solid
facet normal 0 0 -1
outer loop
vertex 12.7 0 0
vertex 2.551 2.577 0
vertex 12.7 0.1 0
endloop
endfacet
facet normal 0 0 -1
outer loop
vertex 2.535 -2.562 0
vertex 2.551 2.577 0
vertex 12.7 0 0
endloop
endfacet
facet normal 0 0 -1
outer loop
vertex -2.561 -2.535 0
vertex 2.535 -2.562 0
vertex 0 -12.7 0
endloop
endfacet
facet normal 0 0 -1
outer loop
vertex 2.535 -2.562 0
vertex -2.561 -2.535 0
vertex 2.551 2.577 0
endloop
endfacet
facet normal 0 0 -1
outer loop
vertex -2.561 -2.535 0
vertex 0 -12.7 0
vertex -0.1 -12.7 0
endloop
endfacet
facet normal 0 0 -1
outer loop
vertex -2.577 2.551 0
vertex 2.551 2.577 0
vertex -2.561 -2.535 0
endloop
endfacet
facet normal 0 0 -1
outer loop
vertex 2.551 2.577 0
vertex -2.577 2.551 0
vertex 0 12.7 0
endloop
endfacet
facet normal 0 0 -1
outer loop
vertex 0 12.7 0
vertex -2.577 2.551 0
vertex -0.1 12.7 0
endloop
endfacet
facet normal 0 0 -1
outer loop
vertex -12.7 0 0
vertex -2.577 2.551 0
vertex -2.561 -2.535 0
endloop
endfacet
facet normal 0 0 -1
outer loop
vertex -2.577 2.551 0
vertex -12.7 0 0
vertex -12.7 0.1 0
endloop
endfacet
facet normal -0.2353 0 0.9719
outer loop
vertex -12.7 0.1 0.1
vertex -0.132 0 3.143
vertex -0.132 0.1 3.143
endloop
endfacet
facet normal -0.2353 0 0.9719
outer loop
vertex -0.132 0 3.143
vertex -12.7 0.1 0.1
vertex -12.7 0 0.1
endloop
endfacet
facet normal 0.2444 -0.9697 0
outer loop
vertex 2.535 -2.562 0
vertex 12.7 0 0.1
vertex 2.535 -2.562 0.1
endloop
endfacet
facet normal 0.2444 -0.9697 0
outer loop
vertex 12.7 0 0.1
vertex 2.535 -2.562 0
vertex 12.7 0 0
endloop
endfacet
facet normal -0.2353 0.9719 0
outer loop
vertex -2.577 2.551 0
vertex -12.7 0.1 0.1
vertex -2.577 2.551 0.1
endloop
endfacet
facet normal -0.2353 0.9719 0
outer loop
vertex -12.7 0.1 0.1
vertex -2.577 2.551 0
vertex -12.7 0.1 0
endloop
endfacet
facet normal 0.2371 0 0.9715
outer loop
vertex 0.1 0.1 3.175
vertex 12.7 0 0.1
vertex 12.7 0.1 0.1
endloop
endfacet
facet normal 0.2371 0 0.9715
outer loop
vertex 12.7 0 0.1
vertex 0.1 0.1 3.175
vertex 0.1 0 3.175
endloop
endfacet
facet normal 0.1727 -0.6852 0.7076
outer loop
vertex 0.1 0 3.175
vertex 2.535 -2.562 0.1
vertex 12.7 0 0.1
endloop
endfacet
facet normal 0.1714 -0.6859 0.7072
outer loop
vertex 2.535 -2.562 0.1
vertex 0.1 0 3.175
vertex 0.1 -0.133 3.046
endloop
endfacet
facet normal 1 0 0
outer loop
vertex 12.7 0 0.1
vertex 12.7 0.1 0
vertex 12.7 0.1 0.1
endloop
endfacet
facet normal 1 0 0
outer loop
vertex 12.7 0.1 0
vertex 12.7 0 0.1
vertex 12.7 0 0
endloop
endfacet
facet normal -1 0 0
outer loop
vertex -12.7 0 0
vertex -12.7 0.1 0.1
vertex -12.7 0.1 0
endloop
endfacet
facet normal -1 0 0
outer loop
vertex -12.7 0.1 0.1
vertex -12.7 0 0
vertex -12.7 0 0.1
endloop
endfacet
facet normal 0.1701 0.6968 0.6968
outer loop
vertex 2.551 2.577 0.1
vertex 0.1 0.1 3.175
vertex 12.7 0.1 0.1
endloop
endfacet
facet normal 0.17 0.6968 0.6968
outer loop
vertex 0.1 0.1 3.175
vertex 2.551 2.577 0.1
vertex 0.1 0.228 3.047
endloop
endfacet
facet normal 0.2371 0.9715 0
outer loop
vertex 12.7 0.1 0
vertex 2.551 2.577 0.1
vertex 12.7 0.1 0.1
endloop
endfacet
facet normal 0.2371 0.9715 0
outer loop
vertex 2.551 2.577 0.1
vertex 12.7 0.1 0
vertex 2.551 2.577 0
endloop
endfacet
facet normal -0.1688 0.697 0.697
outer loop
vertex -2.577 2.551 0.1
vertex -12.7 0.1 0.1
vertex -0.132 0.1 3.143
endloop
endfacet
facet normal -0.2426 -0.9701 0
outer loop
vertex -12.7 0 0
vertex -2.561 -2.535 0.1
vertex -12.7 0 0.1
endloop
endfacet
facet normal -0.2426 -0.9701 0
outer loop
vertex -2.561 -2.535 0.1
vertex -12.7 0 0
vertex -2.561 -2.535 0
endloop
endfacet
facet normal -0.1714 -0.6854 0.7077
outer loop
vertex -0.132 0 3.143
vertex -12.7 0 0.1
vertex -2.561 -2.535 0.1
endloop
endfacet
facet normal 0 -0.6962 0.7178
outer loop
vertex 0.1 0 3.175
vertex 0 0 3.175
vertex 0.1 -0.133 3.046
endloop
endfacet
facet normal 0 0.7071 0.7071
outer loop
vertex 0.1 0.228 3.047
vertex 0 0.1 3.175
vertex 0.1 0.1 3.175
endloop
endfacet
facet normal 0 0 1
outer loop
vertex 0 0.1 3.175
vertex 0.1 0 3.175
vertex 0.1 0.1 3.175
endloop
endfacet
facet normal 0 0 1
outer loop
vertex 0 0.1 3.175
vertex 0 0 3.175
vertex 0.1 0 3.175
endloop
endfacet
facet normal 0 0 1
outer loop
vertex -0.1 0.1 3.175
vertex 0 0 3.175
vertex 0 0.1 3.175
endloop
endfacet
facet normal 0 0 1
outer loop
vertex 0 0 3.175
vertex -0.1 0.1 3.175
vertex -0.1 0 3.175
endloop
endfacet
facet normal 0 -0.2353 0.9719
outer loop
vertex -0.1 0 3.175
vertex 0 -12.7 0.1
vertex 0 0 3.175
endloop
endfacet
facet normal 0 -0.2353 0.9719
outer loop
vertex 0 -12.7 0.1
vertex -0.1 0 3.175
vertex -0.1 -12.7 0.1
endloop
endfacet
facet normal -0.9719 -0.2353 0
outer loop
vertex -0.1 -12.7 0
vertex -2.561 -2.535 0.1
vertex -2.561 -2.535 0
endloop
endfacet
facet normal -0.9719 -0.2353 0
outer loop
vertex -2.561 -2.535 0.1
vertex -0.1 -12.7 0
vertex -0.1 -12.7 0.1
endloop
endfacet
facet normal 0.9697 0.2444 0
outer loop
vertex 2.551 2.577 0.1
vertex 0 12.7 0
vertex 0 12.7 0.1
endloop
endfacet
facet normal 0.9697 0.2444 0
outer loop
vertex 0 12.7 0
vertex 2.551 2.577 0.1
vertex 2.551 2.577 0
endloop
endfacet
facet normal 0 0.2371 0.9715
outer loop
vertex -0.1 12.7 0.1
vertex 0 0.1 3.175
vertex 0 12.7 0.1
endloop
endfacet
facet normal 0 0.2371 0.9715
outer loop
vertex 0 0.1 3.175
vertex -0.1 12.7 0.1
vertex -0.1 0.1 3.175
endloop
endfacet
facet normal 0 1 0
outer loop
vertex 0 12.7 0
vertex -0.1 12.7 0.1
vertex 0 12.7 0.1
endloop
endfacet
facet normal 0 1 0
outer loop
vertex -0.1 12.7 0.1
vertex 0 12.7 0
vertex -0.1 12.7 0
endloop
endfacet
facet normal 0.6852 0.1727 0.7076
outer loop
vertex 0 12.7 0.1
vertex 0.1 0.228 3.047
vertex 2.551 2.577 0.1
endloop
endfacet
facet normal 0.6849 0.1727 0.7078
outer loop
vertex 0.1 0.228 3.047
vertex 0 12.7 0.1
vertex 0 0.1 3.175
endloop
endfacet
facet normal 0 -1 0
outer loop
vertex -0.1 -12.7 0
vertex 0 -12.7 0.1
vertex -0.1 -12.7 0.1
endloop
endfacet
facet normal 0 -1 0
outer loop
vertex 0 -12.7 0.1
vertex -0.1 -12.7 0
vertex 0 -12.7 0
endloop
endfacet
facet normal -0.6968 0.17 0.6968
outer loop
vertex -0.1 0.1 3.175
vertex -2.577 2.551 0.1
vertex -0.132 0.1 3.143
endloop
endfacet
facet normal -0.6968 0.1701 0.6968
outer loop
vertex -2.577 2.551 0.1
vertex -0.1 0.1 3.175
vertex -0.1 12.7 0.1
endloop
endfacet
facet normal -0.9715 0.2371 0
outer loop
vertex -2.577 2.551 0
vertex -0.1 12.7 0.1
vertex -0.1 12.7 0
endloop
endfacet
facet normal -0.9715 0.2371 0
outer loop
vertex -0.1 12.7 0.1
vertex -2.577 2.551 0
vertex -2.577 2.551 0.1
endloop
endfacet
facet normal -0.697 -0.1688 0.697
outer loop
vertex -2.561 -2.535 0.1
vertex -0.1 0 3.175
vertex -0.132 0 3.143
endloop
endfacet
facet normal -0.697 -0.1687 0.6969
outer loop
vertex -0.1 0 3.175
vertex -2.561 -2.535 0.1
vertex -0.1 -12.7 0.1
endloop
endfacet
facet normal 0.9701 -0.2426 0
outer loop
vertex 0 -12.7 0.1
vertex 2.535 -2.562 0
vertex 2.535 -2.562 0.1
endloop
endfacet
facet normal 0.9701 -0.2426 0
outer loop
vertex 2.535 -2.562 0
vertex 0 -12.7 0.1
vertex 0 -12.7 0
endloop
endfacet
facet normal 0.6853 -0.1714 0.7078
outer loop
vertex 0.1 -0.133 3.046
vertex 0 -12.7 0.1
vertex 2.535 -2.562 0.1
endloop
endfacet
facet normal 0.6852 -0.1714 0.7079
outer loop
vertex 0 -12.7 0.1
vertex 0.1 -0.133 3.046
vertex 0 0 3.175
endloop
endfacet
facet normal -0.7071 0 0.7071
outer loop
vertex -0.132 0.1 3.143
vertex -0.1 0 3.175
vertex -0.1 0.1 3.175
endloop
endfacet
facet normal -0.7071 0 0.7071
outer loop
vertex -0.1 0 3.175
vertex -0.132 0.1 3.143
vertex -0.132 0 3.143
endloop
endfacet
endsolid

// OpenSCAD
$fn=180;

in2mm = 25.4;
widestPartOfArm = in2mm/4;

module crossPiece(length, height)
{
    hull()
    {
        translate([-length/2, 0, 0])cube([length, .1, .1]);
        translate([0, -widestPartOfArm/2, 0])cube([.1, widestPartOfArm, .1]);
        translate([0, 0, 0])cube([.1, .1, height]);
    }
}

union(){
    crossPiece(in2mm, in2mm/8);
    rotate([0,0,90])crossPiece(in2mm, in2mm/8);
}
